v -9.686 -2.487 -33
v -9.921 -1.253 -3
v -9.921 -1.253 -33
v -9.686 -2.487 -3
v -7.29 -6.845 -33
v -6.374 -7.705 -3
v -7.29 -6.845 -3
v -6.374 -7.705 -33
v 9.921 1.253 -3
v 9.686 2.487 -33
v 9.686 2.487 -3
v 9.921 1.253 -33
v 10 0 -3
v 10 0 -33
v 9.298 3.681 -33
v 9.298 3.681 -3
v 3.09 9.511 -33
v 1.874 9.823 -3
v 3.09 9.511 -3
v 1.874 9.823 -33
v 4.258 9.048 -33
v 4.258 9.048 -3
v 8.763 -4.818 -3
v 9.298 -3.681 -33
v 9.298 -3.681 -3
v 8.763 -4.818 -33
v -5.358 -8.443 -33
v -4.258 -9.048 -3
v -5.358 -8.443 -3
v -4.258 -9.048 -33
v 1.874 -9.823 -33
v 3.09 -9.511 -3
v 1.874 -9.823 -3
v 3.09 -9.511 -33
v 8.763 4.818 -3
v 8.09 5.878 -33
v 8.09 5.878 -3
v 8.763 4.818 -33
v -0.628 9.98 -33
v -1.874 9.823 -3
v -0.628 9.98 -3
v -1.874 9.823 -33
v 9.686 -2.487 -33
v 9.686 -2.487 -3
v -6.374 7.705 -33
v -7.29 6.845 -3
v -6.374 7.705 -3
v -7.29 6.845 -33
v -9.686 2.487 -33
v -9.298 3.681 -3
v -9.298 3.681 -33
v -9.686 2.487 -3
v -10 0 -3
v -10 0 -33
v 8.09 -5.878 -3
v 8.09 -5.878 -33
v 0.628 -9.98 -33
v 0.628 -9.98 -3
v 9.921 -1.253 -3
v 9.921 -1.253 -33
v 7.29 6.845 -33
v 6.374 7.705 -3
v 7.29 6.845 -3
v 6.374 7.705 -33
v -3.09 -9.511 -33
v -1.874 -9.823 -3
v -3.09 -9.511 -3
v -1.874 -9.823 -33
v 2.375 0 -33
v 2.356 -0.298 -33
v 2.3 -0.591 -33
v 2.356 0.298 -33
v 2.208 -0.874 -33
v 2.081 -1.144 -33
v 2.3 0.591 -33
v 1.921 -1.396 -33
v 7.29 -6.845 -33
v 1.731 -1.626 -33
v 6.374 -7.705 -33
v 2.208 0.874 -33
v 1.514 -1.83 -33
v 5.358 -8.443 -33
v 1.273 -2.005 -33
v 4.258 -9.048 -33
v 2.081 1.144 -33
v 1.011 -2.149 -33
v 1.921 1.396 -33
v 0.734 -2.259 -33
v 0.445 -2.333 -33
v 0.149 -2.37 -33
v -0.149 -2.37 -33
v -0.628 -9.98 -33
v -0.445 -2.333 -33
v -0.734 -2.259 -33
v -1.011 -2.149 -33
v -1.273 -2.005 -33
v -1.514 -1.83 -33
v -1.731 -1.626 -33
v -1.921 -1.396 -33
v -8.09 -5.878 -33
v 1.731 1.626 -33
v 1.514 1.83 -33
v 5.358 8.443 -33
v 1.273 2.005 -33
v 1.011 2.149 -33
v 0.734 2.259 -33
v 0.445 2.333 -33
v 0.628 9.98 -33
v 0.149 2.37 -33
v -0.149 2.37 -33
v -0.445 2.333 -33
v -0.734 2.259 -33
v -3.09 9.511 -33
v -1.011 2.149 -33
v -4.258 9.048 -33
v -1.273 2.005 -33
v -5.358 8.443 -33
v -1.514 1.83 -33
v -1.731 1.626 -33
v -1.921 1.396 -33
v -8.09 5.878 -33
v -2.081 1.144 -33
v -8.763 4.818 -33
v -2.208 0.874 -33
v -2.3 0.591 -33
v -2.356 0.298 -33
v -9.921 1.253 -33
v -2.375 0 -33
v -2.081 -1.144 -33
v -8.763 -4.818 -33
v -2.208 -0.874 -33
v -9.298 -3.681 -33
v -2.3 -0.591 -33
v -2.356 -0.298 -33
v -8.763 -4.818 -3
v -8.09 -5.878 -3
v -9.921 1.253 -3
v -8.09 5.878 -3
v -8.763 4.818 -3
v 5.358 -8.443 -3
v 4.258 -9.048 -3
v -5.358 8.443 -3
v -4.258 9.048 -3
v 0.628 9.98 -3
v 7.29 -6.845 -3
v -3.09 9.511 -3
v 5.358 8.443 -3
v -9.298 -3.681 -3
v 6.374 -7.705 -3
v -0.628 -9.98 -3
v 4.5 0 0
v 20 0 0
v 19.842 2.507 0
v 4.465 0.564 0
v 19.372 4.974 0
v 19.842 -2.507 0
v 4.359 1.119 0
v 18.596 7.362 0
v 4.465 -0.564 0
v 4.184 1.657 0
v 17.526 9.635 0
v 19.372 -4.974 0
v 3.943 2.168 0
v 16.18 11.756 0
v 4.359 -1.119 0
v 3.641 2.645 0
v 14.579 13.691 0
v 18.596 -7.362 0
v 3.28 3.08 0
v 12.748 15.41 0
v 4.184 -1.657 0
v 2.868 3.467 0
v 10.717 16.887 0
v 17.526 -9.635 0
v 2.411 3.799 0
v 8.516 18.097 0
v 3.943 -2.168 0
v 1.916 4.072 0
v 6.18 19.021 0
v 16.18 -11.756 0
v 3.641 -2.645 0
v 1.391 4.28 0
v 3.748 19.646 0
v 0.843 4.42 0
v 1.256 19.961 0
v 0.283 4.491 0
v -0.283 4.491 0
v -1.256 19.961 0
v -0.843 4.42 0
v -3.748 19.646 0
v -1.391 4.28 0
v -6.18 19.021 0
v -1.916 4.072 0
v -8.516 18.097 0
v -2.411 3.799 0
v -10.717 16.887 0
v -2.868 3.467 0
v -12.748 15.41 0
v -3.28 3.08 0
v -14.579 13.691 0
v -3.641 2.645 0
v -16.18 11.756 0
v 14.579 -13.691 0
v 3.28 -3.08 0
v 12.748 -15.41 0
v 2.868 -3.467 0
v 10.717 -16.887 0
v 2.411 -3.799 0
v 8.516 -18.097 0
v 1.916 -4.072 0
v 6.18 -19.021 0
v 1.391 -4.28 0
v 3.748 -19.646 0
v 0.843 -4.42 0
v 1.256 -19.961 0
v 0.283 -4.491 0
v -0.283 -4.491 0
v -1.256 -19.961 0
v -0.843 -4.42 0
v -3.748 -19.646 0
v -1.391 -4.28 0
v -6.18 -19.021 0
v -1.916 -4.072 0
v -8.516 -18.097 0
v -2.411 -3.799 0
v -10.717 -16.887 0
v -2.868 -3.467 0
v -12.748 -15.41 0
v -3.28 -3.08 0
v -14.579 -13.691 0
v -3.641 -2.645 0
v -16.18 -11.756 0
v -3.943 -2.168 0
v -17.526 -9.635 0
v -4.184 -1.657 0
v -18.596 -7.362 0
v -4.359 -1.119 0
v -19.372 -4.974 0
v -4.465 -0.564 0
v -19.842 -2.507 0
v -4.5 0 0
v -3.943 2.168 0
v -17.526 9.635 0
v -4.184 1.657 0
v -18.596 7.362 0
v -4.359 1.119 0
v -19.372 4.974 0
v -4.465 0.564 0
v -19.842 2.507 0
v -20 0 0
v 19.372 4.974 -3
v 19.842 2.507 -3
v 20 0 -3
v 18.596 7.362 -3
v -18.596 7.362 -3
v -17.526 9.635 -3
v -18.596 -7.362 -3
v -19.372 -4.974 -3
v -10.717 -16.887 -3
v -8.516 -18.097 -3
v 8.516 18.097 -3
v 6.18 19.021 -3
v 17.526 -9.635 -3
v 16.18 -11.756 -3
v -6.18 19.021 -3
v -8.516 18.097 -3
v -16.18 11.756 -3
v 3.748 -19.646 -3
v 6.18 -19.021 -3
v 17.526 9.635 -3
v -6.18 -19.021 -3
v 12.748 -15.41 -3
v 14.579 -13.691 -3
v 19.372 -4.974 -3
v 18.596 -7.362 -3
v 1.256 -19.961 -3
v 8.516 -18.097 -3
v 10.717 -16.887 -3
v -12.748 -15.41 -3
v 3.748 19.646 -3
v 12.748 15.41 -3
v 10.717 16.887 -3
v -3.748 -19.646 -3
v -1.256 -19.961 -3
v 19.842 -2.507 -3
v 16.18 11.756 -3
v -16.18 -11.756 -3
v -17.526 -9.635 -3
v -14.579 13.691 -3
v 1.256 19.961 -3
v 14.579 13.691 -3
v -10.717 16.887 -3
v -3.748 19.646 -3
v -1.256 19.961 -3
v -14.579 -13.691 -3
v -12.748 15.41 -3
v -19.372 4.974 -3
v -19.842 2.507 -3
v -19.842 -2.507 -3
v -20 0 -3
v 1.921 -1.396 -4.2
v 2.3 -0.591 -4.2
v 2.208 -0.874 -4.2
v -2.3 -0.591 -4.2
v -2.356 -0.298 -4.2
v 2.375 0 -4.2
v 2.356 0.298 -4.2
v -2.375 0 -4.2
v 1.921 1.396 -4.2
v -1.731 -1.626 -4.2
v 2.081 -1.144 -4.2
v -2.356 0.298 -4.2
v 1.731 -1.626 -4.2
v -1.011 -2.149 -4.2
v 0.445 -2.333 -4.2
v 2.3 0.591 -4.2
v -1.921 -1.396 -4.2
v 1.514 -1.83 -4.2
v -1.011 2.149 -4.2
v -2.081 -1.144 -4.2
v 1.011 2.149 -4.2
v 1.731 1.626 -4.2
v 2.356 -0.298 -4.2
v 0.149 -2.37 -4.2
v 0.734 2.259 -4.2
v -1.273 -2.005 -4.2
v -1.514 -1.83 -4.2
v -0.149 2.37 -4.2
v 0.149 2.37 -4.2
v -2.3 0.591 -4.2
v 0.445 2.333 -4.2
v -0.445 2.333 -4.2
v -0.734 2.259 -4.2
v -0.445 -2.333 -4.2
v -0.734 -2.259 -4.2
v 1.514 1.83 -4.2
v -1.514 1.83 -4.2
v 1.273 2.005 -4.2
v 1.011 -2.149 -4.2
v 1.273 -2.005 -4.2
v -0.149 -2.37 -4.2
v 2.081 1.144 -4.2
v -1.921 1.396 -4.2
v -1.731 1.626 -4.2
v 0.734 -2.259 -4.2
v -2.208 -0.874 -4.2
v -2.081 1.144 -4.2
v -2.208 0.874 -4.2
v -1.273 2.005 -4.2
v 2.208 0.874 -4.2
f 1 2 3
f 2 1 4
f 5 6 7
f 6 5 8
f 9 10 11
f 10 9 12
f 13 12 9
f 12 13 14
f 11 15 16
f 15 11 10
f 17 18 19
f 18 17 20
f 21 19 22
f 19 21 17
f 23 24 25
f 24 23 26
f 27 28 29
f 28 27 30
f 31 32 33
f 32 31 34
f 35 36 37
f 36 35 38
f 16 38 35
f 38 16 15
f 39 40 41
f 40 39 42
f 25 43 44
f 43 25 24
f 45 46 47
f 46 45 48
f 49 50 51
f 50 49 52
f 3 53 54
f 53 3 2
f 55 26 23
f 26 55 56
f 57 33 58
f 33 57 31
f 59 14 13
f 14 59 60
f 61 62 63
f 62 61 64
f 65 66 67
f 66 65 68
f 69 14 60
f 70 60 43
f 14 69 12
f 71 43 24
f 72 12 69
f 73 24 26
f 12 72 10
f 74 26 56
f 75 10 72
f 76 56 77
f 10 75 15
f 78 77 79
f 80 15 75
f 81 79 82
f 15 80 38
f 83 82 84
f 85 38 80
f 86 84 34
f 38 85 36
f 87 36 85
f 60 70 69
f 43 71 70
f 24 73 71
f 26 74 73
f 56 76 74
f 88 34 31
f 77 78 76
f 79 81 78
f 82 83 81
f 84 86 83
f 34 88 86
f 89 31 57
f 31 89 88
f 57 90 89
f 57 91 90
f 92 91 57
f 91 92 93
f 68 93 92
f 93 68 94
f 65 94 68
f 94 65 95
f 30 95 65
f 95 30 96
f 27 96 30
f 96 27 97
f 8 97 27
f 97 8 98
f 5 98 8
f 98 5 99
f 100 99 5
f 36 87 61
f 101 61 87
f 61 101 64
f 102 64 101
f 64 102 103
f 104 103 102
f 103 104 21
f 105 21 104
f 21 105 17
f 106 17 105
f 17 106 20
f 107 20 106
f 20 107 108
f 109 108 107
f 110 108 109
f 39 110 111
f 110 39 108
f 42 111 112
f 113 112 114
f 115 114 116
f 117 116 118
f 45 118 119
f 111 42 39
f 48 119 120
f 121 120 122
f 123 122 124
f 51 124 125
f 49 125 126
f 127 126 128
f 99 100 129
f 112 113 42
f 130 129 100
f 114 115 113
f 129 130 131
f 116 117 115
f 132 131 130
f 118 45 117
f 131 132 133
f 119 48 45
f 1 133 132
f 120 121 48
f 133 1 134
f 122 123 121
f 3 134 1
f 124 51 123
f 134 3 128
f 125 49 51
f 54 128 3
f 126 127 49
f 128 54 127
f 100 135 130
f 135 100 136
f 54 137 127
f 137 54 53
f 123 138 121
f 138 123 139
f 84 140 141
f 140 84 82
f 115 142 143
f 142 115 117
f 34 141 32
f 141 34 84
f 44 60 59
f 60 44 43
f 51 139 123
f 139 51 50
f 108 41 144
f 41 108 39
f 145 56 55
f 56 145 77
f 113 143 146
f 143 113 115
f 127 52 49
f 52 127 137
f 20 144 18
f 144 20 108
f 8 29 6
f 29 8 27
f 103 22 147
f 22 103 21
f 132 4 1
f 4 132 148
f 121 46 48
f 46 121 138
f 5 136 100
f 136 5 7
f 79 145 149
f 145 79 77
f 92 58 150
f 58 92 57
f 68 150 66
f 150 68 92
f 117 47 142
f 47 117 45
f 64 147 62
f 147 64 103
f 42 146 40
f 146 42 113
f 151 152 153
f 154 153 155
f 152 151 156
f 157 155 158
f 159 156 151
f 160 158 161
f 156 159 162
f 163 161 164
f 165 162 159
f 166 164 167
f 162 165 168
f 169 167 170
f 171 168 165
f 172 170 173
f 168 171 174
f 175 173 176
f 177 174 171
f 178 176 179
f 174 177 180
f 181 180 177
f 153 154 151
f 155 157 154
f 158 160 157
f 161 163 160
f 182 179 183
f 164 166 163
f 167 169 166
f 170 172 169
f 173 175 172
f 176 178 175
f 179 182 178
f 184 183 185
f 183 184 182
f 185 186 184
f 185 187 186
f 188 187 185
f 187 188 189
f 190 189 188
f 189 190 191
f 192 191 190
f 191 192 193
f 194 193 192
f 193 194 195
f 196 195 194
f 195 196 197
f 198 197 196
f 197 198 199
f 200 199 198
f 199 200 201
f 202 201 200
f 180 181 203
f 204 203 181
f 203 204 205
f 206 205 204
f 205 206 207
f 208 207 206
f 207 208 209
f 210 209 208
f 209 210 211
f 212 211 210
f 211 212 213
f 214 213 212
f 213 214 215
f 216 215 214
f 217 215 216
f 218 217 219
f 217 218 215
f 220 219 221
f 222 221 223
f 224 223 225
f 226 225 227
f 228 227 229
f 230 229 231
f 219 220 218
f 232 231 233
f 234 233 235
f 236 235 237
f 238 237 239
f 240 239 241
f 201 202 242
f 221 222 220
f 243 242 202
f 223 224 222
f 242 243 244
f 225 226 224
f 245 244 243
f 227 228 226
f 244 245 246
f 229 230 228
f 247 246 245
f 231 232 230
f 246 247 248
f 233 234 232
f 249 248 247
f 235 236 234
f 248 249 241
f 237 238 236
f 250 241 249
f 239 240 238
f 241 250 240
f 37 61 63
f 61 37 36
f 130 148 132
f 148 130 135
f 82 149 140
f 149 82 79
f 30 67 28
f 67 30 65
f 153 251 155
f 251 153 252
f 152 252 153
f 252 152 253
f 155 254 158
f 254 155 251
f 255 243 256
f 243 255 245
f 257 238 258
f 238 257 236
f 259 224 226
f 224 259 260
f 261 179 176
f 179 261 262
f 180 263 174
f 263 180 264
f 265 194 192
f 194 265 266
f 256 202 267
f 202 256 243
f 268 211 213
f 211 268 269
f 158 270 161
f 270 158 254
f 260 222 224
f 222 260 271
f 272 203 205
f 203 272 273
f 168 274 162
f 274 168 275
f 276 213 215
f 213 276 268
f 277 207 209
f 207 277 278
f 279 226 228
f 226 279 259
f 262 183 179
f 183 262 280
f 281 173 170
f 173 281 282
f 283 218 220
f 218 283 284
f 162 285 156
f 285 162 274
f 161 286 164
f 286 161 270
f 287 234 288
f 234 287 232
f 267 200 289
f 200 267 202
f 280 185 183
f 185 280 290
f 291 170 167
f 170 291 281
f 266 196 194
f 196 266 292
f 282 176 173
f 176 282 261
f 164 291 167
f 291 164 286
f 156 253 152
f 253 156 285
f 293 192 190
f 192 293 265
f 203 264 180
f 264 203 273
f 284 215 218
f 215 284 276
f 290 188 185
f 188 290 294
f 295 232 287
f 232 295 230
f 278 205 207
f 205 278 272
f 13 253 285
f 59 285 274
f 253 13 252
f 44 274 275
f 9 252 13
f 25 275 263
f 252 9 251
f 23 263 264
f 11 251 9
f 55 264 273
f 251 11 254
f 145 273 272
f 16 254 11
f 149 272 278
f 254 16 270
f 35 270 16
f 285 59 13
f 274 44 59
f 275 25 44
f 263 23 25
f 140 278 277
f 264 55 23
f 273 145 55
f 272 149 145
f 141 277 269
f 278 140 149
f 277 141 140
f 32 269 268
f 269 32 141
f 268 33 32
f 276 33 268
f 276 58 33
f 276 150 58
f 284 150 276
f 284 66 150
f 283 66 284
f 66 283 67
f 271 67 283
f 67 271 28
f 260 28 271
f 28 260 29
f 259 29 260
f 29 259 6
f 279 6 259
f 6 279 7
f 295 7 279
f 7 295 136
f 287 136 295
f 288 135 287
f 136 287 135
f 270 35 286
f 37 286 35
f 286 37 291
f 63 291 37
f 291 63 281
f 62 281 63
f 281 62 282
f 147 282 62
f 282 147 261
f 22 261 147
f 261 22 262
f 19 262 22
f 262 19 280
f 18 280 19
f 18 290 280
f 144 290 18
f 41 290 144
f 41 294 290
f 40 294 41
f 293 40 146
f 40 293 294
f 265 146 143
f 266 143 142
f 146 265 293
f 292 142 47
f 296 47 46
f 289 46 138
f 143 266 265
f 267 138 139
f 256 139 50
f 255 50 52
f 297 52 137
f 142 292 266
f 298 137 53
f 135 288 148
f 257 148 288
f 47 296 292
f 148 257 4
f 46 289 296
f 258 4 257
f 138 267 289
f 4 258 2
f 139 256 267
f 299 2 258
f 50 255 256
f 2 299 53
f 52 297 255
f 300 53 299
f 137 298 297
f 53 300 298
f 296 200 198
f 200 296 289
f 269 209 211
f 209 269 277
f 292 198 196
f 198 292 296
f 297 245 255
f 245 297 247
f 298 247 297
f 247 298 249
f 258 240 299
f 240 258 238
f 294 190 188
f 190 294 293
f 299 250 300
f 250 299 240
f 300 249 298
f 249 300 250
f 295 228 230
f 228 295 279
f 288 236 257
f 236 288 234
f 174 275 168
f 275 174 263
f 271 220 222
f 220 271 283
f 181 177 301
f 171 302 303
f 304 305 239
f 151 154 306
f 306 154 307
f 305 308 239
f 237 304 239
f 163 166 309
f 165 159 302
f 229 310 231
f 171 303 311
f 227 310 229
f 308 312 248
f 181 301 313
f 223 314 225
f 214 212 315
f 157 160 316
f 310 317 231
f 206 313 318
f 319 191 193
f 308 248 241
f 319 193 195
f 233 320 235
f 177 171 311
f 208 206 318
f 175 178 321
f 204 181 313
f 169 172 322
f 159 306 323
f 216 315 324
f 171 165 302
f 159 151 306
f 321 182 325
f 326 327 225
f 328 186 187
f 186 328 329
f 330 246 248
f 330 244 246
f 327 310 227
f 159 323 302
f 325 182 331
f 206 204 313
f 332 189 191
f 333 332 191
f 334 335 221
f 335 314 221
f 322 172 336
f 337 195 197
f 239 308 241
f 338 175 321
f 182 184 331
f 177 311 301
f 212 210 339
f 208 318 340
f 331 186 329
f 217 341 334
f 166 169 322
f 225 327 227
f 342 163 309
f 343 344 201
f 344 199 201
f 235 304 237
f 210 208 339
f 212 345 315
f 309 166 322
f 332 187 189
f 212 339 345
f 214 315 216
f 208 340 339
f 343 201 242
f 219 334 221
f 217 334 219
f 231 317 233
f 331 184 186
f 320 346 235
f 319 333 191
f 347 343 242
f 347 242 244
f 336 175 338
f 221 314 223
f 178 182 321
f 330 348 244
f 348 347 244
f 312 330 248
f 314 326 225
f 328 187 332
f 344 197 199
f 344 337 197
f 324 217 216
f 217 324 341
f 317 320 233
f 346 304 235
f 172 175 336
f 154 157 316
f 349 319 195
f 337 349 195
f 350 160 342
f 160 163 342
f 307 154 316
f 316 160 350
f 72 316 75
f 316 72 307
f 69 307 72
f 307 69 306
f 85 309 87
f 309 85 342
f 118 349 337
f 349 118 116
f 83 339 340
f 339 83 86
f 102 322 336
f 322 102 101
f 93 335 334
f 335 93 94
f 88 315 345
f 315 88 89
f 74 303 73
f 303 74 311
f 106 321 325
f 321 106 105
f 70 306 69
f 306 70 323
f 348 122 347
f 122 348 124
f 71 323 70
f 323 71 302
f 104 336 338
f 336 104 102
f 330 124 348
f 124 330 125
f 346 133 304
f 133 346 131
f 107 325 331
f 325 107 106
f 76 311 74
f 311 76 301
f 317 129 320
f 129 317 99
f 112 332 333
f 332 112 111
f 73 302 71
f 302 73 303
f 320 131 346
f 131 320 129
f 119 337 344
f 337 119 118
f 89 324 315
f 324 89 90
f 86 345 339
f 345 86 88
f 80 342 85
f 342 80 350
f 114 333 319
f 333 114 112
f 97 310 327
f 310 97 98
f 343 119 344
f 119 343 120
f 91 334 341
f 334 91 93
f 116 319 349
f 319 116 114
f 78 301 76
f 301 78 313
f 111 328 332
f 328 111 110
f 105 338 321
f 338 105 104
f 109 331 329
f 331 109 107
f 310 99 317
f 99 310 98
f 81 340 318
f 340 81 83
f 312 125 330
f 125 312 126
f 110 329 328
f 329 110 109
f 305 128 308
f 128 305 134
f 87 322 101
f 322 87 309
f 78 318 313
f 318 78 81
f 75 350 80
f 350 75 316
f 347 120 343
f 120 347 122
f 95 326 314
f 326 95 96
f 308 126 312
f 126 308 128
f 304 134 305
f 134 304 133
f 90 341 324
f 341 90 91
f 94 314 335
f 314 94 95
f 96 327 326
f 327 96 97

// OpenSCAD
$fn = 50;


difference() {
	union() {
		translate(v = [0, 0, -33.0000000000]) {
			cylinder(h = 33, r = 10.0000000000);
		}
		translate(v = [0, 0, -3.0000000000]) {
			cylinder(h = 3, r = 20.0000000000);
		}
	}
	union() {
		translate(v = [0, 0, 0]) {
			rotate(a = [0, 0, 0]) {
				difference() {
					union() {
						#translate(v = [0, 0, -33.0000000000]) {
							cylinder(h = 33, r = 2.2500000000);
						}
						#translate(v = [0, 0, -4.2000000000]) {
							cylinder(h = 4.2000000000, r1 = 2.3750000000, r2 = 4.5000000000);
						}
						#translate(v = [0, 0, -33.0000000000]) {
							cylinder(h = 33, r = 2.3750000000);
						}
						#translate(v = [0, 0, -33.0000000000]) {
							cylinder(h = 33, r = 2.2500000000);
						}
					}
					union();
				}
			}
		}
	}
}
